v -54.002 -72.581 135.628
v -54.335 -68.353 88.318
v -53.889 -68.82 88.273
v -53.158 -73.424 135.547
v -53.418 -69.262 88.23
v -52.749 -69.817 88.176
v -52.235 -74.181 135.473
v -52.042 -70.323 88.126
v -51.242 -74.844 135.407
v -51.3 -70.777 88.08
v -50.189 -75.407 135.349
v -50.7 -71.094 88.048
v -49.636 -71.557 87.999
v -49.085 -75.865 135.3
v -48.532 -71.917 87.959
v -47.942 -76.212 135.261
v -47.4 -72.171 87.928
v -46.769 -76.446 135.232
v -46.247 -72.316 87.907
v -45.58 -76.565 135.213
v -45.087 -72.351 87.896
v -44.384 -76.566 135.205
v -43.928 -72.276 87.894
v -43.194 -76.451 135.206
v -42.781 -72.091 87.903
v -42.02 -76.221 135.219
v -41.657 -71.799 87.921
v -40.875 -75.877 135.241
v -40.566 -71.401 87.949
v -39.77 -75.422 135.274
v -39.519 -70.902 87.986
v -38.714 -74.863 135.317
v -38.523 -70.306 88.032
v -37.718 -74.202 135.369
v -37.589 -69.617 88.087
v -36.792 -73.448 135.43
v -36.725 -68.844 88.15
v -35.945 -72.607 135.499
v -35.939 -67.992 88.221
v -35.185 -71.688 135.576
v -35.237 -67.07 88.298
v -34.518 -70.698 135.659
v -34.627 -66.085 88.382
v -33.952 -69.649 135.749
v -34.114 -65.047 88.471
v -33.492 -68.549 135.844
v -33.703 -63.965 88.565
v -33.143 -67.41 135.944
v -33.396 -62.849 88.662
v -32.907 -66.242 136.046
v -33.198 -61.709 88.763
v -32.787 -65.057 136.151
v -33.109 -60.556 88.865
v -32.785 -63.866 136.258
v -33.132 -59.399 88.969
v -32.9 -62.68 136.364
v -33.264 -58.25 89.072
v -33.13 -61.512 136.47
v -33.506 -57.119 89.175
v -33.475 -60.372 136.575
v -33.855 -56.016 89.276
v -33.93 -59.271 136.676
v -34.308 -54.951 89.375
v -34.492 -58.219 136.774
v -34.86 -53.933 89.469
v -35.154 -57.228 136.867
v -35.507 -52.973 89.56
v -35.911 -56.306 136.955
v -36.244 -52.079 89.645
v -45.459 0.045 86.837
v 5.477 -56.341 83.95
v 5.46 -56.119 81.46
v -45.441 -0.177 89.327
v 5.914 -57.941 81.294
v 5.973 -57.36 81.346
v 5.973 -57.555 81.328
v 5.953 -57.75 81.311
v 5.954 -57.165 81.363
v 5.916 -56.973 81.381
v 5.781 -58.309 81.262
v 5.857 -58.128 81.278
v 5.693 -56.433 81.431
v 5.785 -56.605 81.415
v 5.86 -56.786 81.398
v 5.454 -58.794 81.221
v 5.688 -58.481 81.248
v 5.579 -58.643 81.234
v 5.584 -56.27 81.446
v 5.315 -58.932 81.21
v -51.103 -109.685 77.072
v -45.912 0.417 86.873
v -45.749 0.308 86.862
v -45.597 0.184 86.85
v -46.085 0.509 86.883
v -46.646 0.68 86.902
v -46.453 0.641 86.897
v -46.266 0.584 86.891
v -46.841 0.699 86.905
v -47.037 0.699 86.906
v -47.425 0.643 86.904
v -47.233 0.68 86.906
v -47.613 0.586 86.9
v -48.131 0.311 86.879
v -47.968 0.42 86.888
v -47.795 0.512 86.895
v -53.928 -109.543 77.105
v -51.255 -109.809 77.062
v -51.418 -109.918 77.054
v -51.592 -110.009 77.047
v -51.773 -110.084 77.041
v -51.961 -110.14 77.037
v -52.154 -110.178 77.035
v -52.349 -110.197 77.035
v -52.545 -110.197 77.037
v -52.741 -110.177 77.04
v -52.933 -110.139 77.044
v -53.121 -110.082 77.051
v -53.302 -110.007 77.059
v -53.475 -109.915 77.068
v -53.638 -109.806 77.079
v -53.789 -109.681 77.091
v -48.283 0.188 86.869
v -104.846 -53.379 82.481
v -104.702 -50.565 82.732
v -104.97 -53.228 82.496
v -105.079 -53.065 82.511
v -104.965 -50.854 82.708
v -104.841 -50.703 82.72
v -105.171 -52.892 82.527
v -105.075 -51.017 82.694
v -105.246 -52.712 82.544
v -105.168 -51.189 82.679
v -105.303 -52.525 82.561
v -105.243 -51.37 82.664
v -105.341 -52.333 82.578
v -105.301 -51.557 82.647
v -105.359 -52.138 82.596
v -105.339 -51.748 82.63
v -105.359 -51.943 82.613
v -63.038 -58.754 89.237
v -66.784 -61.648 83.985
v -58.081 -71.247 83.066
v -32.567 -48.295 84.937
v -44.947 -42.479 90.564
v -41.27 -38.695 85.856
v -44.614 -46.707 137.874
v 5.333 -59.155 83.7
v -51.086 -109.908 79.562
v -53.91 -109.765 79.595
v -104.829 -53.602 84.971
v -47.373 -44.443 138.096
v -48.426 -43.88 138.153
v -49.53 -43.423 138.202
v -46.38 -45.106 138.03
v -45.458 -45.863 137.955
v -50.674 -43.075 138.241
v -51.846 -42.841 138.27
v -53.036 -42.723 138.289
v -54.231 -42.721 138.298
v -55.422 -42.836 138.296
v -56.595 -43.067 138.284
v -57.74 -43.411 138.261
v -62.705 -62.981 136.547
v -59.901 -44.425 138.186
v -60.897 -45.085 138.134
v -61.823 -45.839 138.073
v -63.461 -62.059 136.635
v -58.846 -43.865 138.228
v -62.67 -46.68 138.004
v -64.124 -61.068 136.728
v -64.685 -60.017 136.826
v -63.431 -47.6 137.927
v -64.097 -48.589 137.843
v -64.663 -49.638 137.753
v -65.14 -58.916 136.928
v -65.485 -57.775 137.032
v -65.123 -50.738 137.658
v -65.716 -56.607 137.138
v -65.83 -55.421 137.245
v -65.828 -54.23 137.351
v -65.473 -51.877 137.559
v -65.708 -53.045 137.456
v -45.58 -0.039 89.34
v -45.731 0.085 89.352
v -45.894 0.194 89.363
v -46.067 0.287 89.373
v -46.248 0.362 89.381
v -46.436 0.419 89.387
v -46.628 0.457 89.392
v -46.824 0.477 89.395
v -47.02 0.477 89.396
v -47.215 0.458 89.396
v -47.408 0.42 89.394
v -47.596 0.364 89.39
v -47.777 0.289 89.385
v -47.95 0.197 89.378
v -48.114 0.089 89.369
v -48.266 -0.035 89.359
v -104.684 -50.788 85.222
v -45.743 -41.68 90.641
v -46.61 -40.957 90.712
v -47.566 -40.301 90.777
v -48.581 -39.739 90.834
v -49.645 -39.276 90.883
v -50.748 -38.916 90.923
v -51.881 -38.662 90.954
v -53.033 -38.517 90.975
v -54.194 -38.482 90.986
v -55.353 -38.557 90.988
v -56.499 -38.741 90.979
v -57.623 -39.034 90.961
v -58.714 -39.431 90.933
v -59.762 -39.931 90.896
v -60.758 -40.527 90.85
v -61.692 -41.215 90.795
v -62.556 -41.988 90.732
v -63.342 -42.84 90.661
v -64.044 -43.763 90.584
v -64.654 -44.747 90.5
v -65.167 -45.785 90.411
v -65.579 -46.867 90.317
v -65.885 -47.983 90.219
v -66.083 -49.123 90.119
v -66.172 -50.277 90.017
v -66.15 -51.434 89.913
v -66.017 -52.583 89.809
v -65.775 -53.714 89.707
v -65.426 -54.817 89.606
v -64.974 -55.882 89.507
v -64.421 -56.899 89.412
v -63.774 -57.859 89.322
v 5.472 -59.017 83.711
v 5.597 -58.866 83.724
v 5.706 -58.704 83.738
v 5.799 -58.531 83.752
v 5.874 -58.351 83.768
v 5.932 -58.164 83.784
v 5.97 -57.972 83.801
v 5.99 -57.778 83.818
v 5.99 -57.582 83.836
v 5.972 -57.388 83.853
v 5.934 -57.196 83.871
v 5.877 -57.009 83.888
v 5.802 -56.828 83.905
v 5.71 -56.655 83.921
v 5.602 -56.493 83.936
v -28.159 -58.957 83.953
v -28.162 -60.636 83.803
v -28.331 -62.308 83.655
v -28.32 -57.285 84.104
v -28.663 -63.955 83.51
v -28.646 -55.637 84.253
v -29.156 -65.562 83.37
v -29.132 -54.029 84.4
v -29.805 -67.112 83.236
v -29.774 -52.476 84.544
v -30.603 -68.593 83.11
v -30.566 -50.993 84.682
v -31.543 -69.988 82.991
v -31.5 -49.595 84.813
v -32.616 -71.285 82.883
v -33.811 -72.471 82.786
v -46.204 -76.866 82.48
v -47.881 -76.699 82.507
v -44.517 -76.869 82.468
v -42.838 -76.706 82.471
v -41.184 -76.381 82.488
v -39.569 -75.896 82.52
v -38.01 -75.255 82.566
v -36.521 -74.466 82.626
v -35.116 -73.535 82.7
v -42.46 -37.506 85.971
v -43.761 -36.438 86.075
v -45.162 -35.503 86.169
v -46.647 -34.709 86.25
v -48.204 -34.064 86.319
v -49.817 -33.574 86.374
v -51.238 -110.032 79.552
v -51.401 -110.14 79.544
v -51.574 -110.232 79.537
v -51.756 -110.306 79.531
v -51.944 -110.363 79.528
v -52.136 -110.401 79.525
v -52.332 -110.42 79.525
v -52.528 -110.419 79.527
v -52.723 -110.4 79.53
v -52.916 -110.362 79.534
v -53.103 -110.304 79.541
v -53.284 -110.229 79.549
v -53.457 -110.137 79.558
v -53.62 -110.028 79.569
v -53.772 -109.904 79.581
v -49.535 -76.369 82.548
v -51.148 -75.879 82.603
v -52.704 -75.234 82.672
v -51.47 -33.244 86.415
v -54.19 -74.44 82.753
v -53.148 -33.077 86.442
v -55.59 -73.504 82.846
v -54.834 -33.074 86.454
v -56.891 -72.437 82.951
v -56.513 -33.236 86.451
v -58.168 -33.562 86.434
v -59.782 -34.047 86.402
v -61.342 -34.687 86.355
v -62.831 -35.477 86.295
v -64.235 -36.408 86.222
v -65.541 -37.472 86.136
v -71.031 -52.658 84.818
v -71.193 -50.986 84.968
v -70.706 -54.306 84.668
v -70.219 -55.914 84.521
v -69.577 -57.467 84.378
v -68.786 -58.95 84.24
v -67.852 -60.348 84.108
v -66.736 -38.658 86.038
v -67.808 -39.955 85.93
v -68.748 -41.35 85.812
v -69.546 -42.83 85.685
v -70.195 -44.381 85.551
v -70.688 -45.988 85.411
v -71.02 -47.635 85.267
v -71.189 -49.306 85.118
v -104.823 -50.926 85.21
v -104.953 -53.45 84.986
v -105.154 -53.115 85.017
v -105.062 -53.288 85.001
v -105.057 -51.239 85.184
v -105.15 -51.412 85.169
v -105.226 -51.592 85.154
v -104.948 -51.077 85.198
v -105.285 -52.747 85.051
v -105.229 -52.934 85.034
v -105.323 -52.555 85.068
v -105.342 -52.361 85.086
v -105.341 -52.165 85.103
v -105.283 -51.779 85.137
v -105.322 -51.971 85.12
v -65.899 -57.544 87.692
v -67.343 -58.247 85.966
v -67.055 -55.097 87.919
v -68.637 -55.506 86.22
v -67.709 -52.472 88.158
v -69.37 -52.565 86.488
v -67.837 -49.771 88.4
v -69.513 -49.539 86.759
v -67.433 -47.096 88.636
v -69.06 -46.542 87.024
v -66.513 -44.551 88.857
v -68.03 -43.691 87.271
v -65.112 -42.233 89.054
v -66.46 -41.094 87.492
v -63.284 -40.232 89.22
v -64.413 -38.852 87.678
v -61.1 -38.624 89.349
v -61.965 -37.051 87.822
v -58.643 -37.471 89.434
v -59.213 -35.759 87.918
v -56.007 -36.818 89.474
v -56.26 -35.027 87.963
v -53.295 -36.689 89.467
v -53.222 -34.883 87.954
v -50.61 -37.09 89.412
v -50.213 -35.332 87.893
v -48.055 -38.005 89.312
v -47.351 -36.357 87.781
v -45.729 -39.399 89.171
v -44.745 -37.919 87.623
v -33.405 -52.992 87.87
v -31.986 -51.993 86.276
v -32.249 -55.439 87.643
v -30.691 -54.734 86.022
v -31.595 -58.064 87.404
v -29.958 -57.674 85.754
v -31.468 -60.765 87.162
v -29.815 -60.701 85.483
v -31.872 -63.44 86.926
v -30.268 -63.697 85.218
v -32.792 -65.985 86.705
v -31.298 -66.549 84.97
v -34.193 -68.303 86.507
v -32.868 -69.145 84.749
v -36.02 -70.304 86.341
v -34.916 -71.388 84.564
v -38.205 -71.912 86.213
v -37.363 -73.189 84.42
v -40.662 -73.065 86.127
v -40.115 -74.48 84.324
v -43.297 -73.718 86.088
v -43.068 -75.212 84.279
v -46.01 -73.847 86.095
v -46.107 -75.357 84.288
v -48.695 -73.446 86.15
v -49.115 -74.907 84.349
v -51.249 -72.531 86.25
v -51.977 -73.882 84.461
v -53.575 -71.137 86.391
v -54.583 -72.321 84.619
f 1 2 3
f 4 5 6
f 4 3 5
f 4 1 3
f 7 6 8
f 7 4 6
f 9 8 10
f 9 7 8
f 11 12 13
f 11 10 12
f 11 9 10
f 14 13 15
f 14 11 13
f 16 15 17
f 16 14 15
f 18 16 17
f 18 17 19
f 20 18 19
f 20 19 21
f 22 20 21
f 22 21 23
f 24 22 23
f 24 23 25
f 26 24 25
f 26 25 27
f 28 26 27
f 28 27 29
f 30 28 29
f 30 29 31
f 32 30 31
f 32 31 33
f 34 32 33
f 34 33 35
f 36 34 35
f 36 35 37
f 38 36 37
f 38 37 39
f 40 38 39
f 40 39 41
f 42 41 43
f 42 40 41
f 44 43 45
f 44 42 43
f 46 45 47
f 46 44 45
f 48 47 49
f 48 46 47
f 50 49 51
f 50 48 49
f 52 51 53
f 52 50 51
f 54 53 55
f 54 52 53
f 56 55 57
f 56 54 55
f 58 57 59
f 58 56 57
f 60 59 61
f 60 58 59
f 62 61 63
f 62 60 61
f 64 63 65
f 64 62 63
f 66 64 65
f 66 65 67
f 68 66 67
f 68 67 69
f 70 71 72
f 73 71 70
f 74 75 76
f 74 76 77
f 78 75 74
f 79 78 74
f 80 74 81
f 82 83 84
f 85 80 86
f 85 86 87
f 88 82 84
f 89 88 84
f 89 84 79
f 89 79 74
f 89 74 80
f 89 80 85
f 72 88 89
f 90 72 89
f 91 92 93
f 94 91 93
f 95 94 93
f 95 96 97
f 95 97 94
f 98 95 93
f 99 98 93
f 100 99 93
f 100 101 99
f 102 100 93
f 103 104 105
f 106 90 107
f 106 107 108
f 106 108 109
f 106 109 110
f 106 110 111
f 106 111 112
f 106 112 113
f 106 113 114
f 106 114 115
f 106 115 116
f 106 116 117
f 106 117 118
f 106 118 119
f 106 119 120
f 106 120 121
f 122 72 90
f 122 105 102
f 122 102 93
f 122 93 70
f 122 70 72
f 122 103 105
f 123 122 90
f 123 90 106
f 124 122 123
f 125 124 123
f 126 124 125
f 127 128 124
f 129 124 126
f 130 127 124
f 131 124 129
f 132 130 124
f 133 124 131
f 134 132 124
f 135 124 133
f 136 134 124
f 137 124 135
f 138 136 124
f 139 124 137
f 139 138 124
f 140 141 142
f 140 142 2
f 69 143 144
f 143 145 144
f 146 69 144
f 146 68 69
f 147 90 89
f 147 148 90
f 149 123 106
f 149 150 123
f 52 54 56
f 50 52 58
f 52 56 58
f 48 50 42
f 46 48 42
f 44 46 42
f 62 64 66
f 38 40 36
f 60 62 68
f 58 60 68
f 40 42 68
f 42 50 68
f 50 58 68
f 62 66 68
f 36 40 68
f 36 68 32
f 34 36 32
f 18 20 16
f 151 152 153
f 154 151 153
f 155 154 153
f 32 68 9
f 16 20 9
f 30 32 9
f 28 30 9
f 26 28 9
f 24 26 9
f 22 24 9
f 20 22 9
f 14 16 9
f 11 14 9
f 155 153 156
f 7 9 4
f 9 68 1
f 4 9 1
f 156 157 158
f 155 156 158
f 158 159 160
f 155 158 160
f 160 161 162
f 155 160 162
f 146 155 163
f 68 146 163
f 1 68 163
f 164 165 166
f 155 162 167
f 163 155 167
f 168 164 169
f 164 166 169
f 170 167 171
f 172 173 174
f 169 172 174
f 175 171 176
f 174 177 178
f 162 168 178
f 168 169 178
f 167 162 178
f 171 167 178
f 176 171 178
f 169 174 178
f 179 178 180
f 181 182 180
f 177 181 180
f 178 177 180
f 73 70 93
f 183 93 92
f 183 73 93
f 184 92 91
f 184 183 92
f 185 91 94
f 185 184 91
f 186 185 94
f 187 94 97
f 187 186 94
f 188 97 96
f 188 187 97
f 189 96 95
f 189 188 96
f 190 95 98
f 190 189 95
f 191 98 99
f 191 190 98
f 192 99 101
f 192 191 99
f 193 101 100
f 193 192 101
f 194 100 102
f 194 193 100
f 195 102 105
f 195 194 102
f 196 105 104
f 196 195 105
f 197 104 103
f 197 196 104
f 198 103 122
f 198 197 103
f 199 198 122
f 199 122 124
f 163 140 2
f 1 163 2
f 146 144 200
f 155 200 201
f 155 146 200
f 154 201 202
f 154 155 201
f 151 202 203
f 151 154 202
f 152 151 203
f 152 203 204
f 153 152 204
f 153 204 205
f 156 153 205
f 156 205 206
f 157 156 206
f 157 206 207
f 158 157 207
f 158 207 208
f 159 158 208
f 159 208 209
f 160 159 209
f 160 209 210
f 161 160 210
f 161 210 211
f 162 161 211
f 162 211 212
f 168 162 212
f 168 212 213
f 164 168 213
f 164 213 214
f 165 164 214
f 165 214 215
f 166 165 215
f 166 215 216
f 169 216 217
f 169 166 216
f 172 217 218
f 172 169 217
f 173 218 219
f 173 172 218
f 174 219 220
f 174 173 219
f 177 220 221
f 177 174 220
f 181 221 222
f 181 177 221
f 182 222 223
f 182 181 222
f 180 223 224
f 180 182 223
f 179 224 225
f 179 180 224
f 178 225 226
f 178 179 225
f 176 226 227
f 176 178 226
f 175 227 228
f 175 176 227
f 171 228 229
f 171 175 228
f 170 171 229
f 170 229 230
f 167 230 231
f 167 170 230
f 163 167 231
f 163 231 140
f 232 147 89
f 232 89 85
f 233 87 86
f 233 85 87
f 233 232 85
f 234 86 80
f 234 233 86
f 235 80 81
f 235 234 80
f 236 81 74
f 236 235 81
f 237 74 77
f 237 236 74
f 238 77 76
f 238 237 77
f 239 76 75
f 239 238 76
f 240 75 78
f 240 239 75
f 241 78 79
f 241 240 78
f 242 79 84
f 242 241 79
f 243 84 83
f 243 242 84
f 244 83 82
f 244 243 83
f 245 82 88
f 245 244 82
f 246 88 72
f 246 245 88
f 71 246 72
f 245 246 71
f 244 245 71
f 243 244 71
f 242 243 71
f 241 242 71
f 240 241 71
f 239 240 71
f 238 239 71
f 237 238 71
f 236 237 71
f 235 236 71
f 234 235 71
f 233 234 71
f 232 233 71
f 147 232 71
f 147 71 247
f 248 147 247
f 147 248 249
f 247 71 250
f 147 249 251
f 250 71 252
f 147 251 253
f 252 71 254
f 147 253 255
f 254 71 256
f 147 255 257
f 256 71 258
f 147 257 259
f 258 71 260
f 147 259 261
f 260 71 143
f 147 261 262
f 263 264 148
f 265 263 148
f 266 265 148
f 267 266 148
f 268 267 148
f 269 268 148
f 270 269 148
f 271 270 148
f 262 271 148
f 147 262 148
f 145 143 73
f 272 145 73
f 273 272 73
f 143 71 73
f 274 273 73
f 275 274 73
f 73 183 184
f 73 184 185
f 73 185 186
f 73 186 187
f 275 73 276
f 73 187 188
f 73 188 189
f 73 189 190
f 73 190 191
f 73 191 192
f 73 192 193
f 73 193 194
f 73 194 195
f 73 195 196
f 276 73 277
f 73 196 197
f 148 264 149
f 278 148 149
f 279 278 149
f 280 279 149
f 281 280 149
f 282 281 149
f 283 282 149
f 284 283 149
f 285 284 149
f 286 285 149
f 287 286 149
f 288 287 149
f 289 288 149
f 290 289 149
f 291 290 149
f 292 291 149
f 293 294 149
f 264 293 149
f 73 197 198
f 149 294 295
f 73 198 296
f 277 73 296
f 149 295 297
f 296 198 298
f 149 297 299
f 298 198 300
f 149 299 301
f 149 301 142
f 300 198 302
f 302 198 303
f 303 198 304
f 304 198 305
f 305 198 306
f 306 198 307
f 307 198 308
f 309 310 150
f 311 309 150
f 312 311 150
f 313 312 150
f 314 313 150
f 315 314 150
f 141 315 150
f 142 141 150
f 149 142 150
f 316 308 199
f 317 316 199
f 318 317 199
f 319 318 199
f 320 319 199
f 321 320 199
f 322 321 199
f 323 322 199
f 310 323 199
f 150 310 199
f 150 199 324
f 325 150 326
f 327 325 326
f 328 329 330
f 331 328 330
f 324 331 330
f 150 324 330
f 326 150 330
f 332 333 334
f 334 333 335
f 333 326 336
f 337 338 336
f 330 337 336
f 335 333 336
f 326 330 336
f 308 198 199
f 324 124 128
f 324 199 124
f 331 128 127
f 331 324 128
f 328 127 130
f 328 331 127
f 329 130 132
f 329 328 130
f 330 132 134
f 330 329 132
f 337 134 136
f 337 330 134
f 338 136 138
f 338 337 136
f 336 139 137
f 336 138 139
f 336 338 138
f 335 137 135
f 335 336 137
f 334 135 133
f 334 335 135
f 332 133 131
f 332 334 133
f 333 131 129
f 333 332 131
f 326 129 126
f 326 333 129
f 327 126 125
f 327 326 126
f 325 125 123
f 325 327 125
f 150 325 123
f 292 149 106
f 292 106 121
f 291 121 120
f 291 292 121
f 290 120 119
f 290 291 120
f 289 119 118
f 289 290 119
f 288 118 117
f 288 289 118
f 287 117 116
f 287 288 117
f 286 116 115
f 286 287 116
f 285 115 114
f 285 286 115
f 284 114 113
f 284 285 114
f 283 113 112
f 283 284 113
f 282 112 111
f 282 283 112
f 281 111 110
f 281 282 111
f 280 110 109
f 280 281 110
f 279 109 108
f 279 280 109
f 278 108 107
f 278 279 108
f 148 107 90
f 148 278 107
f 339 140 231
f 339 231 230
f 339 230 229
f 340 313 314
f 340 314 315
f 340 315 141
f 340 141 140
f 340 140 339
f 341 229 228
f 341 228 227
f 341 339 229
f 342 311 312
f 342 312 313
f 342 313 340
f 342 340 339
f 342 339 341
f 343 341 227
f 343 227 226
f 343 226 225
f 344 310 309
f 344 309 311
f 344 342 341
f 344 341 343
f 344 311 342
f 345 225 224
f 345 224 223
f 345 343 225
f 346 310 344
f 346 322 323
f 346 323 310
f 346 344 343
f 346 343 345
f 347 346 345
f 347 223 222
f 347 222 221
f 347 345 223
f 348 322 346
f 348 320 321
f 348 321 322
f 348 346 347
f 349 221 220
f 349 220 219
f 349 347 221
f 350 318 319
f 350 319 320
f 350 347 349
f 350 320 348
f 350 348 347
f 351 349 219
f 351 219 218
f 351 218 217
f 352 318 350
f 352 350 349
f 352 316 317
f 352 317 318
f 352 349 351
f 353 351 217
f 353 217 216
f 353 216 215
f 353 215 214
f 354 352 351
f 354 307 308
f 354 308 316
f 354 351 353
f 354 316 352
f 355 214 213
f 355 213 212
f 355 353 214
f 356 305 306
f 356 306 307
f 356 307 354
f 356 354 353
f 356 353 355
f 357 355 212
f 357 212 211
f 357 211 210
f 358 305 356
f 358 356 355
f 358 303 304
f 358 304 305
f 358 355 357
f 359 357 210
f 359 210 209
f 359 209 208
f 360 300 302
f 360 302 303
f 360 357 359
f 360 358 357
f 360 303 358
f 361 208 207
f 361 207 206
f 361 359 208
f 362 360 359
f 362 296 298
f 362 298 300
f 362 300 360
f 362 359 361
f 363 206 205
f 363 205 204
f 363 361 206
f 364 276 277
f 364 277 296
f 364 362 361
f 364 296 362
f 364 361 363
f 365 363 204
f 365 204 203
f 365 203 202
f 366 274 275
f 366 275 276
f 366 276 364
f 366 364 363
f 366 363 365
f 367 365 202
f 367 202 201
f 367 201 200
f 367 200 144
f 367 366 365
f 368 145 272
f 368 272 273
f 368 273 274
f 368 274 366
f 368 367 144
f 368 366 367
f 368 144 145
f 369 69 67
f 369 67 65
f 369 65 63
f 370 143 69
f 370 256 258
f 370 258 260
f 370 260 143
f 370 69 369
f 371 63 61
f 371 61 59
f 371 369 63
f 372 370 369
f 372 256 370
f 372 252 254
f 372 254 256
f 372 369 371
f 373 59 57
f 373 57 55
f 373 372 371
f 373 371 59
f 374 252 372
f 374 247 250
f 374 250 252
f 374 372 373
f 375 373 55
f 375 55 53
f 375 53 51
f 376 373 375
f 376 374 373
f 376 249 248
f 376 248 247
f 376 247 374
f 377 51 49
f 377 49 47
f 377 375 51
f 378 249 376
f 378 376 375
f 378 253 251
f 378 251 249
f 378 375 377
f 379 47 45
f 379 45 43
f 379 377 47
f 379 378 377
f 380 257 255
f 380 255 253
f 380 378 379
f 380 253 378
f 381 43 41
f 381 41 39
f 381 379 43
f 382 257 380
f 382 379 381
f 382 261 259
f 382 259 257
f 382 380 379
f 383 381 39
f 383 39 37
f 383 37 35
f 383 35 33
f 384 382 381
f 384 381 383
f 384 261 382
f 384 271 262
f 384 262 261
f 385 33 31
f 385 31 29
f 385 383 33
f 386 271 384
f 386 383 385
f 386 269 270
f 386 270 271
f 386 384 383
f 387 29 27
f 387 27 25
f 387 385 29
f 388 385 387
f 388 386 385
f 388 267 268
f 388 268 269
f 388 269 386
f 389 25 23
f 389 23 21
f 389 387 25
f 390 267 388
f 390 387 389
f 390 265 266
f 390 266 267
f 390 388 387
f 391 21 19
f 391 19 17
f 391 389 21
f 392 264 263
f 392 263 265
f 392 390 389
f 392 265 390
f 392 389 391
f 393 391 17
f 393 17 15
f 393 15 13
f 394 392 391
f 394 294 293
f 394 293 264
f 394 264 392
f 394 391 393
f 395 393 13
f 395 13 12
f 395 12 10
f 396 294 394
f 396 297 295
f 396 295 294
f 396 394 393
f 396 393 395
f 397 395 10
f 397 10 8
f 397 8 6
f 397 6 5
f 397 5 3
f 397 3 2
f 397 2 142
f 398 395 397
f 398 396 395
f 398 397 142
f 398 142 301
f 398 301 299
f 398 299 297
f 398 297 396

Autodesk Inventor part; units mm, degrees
ref_plane "YZ Plane" through (0, 0, 0) normal (1, 0, 0) x (0, 1, 0)
ref_plane "XZ Plane" through (0, 0, 0) normal (0, 1, 0) x (-1, 0, 0)
ref_plane "Work Plane1" through (-49.3077, -59.6436, 136.7512) normal (-0.0070087, 0.0889934, -0.9960076) x (-0.7423447, -0.6678024, -0.0544445)
sketch "Sketch1" plane through (-49.3077, -59.6436, 136.7512) normal (-0.0070087, 0.0889934, -0.9960076) x (-0.7423447, -0.6678024, -0.0544445)
  arc A0 (12.185, 6.495) -> (-12.185, 6.495) centre (0, 6.495) ccw projected
  arc A1 (12.185, 6.495) -> (-12.185, 6.495) centre (0, 6.495) ccw projected
  line L0 (-12.185, -6.495) -> (-12.185, 6.495) projected
  arc A2 (-12.185, -6.495) -> (12.185, -6.495) centre (0, -6.495) ccw projected
  arc A3 (-12.185, -6.495) -> (12.185, -6.495) centre (0, -6.495) ccw projected
  line L1 (12.185, 6.495) -> (12.185, -6.495) projected
  line L2 (-10.685, -6.495) -> (-10.685, 6.005)
  arc A4 (10.685, 6.495) -> (-10.685, 6.495) centre (0, 6.495) ccw
  arc A5 (-10.685, -6.495) -> (10.685, -6.495) centre (0, -6.495) ccw
  line L3 (10.685, 6.495) -> (10.685, -6.005)
  point P0 (-68.9881, 1.367)
  point P1 (10.685, 6.495)
  point P2 (10.5, -6.25)
  point P3 (-10.685, -6.495)
  point P4 (-10.5, 6.25)
  dimension "d0" = 1.5
  dimension "d1" = 1.5
  dimension "d2" = 1.5
  dimension "d3" = 1.5
extrude "Extrusion1" add sketch "Sketch1" along normal blind 50
sketch "Sketch2" plane through (-49.6582, -55.1939, 86.9509) normal (-0.0070087, 0.0889934, -0.9960076) x (-0.7423447, -0.6678024, -0.0544445)
  arc A0 (12.185, 6.495) -> (-12.185, 6.495) centre (0, 6.495) ccw projected
  line L0 (12.185, -6.495) -> (12.185, 6.495) projected
  arc A1 (-12.185, -6.495) -> (12.185, -6.495) centre (0, -6.495) ccw projected
  line L1 (-12.185, 6.495) -> (-12.185, -6.495) projected
  point P0 (-68.9881, 1.367)
extrude "Extrusion2" add sketch "Sketch2" along normal blind 2.5
sketch "Sketch3" plane through (-49.6757, -54.9714, 84.4608) normal (-0.0070087, 0.0889934, -0.9960076) x (-0.7423447, -0.6678024, -0.0544445)
  line L0 (-38, 40) -> (38, 40)
  line L1 (40, 38) -> (40, -38)
  line L2 (38, -40) -> (-38, -40)
  line L3 (-40, -38) -> (-40, 38)
  arc A0 (12.185, 6.495) -> (-12.185, 6.495) centre (0, 6.495) ccw projected
  line L4 (0, 40) -> (0, 18.68)
  arc A1 (-12.185, -6.495) -> (12.185, -6.495) centre (0, -6.495) ccw projected
  line L5 (0, -18.68) -> (0, -40)
  line L6 (-12.185, 6.495) -> (-12.185, -6.495) projected
  line L7 (-12.185, 0) -> (-40, 0)
  line L8 (12.185, -6.495) -> (12.185, 6.495) projected
  line L9 (12.185, 0) -> (40, 0)
  arc A2 (-38, 40) -> (-40, 38) centre (-38, 38) ccw
  arc A3 (40, 38) -> (38, 40) centre (38, 38) ccw
  arc A4 (-40, -38) -> (-38, -40) centre (-38, -38) ccw
  arc A5 (38, -40) -> (40, -38) centre (38, -38) ccw
  point P0 (-68.9881, 1.367)
  point P1 (-40, 40)
  point P2 (40, -40)
  point P3 (-40, -40)
  dimension "d8" = 80
  dimension "d9" = 80
  dimension "d11" = 2
  dimension "d12" = 2
  dimension "d13" = 2
  dimension "d14" = 2
extrude "Extrusion3" add sketch "Sketch3" along normal blind 2.5
chamfer "Chamfer1" distance 5 angle 45 4 edges at (-58.7212, -63.1086, 83.7974) (-62.1909, -41.1669, 85.7823) (-40.6302, -46.8343, 85.1242) (-37.1604, -68.7759, 83.1393)
properties part number "Staging_area"
